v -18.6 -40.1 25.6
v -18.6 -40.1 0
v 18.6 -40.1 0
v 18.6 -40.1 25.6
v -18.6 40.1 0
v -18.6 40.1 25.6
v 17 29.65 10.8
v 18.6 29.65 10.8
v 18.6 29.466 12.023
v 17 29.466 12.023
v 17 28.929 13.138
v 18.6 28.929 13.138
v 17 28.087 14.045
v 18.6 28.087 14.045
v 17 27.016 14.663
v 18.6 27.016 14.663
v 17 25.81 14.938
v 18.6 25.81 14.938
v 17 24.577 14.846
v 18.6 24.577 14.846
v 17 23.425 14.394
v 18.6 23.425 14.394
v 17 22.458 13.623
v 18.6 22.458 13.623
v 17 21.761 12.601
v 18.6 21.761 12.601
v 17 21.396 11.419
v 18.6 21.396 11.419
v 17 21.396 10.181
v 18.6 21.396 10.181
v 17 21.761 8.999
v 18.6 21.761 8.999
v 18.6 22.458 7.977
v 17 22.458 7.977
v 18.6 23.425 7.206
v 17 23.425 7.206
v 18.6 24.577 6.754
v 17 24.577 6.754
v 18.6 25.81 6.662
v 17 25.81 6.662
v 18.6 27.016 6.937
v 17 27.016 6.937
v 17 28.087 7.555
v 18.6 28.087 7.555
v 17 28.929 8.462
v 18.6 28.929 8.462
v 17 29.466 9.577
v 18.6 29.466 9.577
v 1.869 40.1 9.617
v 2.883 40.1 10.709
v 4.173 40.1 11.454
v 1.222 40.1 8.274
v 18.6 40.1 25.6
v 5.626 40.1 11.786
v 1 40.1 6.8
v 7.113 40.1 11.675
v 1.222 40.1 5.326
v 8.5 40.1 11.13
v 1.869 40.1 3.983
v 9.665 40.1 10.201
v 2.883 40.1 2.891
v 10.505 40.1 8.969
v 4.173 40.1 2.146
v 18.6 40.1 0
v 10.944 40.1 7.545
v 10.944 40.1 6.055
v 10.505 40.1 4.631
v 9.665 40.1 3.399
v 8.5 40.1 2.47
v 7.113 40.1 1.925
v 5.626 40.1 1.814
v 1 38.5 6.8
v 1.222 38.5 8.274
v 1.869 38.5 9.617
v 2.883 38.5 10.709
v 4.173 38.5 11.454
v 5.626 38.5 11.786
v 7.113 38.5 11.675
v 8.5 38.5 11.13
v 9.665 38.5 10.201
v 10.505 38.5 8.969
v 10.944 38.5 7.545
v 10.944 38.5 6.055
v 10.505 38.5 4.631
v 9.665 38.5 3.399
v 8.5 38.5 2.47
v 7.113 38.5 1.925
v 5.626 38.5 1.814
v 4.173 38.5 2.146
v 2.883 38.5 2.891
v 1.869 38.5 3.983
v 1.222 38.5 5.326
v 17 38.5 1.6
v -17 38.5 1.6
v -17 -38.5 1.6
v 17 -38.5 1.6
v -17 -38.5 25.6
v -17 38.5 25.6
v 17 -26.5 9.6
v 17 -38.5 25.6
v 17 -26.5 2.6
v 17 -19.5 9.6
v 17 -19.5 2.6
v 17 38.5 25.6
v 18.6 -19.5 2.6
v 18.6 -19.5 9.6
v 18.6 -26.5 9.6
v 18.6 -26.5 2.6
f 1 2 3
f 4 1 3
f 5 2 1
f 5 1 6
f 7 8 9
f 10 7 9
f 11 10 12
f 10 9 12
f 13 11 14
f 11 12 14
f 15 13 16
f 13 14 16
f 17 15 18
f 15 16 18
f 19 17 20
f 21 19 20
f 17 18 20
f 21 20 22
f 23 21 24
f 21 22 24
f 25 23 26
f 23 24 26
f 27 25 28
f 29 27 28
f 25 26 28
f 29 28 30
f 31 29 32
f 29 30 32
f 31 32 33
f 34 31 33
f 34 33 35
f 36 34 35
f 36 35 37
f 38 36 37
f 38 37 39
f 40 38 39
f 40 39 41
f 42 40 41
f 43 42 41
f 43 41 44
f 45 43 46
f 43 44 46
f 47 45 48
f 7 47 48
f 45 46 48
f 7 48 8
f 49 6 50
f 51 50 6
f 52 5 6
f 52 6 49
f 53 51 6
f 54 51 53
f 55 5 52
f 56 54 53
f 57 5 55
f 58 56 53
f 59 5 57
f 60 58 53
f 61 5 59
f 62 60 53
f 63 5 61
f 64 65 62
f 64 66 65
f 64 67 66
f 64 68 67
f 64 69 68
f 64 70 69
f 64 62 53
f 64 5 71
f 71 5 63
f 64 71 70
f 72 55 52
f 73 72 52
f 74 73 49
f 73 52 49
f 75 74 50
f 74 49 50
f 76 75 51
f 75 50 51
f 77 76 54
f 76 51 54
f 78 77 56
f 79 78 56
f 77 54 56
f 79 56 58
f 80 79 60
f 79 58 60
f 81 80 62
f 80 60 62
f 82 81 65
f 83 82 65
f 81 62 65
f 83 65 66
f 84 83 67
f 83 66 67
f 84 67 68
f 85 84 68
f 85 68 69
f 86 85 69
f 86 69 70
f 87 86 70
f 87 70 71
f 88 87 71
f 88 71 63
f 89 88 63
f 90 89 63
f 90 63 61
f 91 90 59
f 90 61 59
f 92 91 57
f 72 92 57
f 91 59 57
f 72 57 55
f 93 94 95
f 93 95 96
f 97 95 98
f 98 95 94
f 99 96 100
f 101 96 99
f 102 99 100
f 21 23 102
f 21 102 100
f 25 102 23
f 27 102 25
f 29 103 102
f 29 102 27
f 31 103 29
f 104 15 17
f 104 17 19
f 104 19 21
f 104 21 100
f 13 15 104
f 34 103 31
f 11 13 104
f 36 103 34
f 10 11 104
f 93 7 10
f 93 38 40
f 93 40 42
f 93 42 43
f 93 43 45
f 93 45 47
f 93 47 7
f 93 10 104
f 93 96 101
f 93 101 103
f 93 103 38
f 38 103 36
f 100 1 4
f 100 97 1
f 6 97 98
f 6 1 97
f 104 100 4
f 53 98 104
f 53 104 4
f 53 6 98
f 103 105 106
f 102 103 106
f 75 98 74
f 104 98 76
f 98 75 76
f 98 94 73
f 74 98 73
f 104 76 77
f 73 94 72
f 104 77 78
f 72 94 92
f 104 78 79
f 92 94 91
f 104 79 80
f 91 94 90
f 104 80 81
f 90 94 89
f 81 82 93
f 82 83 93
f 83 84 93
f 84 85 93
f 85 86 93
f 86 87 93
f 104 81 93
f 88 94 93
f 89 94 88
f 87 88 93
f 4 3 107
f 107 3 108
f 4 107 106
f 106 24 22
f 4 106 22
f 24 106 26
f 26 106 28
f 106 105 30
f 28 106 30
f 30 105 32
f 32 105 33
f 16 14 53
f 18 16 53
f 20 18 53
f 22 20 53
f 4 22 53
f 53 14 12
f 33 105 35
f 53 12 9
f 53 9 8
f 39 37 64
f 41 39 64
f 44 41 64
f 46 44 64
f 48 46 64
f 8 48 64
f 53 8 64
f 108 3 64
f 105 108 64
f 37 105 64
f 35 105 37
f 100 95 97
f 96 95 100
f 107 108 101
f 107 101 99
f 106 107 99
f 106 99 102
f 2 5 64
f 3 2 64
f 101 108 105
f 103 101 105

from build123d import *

# Parameters (mm, degrees)
F0_W     = 34
F0_H     = 77
F1_DEPTH = 1.6
F0_W_2   = 37.2
F0_H_2   = 80.2
F2_DEPTH = 25.6
F3_R     = 5
F4_DEPTH = 1.6
F5_R     = 4.15
F5_W     = 7
F5_H     = 7
F6_DEPTH = 1.6


with BuildPart() as f1:
    # F0 (on Top) → F1 (new body)
    with BuildSketch(Plane.XY):
        Rectangle(F0_W, F0_H)
    extrude(amount=F1_DEPTH)

    # F0 (on Top) → F2 (join)
    with BuildSketch(Plane.XY):
        Rectangle(F0_W_2, F0_H_2)
        Rectangle(F0_W, F0_H, mode=Mode.SUBTRACT)
    extrude(amount=F2_DEPTH)

    # F3 (on face) → F4 (cut, through all)
    with BuildSketch(Plane(origin=(0, 40.1, 0), x_dir=(-1, 0, 0), z_dir=(0, 1, 0))):
        with Locations((-6, 6.8)):
            Circle(F3_R)
    extrude(amount=-F4_DEPTH, mode=Mode.SUBTRACT)

    # F5 (on face) → F6 (cut, through all)
    with BuildSketch(Plane.YZ.offset(18.6)):
        with Locations((25.5, 10.8)):
            Circle(F5_R)
        with Locations((-23, 6.1)):
            Rectangle(F5_W, F5_H)
    extrude(amount=-F6_DEPTH, mode=Mode.SUBTRACT)


solid = f1.part
